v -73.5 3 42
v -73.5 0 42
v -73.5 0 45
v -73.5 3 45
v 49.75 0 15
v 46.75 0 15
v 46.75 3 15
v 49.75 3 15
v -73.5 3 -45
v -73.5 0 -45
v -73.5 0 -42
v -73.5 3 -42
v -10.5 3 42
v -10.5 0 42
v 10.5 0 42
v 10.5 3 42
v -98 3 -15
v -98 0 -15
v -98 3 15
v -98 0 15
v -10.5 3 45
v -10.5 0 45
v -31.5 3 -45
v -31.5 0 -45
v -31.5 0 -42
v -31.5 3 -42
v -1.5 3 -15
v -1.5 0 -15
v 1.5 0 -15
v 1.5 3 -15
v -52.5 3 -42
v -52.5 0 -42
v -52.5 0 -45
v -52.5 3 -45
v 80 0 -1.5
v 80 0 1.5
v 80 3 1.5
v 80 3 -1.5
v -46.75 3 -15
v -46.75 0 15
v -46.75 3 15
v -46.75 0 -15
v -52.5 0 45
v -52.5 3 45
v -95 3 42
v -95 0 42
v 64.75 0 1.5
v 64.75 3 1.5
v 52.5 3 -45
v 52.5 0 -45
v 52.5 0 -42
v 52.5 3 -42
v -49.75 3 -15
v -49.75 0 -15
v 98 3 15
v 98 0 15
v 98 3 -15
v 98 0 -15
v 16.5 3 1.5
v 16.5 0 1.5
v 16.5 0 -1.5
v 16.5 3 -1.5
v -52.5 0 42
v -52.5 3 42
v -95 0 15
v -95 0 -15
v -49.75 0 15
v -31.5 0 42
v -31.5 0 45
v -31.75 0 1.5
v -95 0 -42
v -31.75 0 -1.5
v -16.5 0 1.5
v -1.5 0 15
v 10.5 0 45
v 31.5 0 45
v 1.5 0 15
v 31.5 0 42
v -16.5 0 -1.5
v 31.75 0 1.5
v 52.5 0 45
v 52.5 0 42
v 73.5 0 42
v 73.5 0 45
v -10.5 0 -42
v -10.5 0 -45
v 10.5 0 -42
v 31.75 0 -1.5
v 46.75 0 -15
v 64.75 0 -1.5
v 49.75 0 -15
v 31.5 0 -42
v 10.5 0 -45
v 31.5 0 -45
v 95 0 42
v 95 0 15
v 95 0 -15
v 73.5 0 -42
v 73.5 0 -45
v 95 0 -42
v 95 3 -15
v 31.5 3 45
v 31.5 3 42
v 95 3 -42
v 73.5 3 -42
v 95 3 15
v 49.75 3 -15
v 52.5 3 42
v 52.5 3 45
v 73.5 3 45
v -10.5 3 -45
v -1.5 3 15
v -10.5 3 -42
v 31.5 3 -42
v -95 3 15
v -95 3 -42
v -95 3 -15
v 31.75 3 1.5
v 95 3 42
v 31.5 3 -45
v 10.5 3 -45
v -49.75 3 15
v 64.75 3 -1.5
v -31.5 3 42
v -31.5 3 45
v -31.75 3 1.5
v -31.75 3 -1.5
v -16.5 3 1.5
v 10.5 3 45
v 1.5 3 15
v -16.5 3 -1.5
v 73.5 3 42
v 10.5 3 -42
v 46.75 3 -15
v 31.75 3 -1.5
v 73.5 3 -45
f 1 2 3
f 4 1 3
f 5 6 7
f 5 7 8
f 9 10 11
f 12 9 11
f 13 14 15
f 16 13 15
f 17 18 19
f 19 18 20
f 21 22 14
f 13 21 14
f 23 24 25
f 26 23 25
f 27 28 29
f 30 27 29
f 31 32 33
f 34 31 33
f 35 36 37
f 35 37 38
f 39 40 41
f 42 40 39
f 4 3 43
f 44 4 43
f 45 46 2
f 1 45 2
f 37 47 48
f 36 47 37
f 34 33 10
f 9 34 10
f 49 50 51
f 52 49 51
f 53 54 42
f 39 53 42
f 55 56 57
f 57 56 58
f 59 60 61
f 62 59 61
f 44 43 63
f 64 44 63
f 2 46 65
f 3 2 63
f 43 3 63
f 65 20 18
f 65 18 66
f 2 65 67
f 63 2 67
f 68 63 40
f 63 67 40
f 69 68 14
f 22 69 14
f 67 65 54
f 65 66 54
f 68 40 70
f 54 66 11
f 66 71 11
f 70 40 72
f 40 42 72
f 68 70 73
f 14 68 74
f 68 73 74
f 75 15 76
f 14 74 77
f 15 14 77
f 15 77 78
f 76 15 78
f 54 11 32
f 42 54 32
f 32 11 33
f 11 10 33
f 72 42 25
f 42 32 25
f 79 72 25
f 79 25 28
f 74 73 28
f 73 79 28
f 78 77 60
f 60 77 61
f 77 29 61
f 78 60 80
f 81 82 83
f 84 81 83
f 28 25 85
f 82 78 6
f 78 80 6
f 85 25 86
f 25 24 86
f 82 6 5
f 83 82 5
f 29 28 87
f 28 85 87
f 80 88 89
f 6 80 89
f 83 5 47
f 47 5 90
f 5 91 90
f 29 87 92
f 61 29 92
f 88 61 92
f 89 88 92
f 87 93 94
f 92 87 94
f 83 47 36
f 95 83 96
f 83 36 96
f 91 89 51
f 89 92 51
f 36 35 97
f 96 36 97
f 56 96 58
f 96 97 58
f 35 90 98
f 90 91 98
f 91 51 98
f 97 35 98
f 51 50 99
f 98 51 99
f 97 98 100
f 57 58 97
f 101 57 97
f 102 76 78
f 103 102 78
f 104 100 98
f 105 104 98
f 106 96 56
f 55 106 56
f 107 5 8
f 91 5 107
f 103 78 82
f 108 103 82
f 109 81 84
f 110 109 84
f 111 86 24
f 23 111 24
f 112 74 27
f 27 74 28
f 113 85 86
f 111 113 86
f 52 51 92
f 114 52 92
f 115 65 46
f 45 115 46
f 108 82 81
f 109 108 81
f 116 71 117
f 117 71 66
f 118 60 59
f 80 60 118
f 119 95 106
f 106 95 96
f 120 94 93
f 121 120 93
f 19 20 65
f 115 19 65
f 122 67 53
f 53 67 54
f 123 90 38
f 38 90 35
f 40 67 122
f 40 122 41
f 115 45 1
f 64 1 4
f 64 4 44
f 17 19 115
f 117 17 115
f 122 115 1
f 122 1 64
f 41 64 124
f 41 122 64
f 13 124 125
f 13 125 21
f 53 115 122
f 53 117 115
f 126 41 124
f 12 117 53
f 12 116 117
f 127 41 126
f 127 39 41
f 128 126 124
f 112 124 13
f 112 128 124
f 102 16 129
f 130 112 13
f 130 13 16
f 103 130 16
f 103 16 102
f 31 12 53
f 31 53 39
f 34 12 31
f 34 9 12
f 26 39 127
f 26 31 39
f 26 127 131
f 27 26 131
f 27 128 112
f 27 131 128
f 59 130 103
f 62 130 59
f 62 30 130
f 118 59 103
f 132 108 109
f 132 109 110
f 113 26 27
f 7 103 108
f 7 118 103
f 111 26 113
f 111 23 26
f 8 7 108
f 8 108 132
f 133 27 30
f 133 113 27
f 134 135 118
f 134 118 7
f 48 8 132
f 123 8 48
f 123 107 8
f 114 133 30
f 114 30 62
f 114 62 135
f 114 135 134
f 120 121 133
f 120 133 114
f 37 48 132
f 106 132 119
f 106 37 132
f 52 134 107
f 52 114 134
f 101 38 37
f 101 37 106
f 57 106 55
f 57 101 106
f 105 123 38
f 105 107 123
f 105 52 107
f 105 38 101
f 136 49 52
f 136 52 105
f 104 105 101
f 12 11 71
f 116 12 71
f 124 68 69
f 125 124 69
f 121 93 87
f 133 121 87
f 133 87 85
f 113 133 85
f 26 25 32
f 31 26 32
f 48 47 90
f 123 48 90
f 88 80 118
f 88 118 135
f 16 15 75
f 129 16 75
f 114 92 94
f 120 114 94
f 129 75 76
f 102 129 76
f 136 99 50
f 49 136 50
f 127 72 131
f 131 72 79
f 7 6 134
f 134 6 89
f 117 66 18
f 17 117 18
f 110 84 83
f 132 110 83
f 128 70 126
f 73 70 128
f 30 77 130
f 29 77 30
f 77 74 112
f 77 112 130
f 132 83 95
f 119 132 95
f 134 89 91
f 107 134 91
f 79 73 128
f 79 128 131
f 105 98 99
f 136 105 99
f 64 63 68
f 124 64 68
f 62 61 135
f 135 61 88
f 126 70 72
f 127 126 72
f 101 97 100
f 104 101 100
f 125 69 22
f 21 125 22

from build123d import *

# Parameters (mm, degrees)
SKETCH1_W           = 3
SKETCH1_H           = 30
SKETCH1_W_2         = 15.25
SKETCH1_H_2         = 3
BOSS_EXTRUDE1_DEPTH = 3


with BuildPart() as part:
    # Sketch1 → Boss-Extrude1 (new body)
    with BuildSketch(Plane(origin=(0, 0, 0), x_dir=(1, 0, 0), z_dir=(0, 1, 0))):
        Polygon((-95, 15), (-98, 15), (-98, -15), (-95, -15), (-95, -42), (-73.5, -42), (-73.5, -45), (-52.5, -45), (-52.5, -42), (-31.5, -42), (-31.5, -45), (-10.5, -45), (-10.5, -42), (10.5, -42), (10.5, -45), (31.5, -45), (31.5, -42), (52.5, -42), (52.5, -45), (73.5, -45), (73.5, -42), (95, -42), (95, -15), (98, -15), (98, 15), (95, 15), (95, 42), (73.5, 42), (73.5, 45), (52.5, 45), (52.5, 42), (31.5, 42), (31.5, 45), (10.5, 45), (10.5, 42), (-10.5, 42), (-10.5, 45), (-31.5, 45), (-31.5, 42), (-52.5, 42), (-52.5, 45), (-73.5, 45), (-73.5, 42), (-95, 42), align=None)
        Rectangle(SKETCH1_W, SKETCH1_H, mode=Mode.SUBTRACT)
        with Locations((48.25, 0)):
            Rectangle(SKETCH1_W, SKETCH1_H, mode=Mode.SUBTRACT)
        with Locations((72.375, 0)):
            Rectangle(SKETCH1_W_2, SKETCH1_H_2, mode=Mode.SUBTRACT)
        with Locations((-48.25, 0)):
            Rectangle(SKETCH1_W, SKETCH1_H, mode=Mode.SUBTRACT)
        with Locations((-24.125, 0)):
            Rectangle(SKETCH1_W_2, SKETCH1_H_2, mode=Mode.SUBTRACT)
        with Locations((24.125, 0)):
            Rectangle(SKETCH1_W_2, SKETCH1_H_2, mode=Mode.SUBTRACT)
    extrude(amount=BOSS_EXTRUDE1_DEPTH)


solid = part.part
